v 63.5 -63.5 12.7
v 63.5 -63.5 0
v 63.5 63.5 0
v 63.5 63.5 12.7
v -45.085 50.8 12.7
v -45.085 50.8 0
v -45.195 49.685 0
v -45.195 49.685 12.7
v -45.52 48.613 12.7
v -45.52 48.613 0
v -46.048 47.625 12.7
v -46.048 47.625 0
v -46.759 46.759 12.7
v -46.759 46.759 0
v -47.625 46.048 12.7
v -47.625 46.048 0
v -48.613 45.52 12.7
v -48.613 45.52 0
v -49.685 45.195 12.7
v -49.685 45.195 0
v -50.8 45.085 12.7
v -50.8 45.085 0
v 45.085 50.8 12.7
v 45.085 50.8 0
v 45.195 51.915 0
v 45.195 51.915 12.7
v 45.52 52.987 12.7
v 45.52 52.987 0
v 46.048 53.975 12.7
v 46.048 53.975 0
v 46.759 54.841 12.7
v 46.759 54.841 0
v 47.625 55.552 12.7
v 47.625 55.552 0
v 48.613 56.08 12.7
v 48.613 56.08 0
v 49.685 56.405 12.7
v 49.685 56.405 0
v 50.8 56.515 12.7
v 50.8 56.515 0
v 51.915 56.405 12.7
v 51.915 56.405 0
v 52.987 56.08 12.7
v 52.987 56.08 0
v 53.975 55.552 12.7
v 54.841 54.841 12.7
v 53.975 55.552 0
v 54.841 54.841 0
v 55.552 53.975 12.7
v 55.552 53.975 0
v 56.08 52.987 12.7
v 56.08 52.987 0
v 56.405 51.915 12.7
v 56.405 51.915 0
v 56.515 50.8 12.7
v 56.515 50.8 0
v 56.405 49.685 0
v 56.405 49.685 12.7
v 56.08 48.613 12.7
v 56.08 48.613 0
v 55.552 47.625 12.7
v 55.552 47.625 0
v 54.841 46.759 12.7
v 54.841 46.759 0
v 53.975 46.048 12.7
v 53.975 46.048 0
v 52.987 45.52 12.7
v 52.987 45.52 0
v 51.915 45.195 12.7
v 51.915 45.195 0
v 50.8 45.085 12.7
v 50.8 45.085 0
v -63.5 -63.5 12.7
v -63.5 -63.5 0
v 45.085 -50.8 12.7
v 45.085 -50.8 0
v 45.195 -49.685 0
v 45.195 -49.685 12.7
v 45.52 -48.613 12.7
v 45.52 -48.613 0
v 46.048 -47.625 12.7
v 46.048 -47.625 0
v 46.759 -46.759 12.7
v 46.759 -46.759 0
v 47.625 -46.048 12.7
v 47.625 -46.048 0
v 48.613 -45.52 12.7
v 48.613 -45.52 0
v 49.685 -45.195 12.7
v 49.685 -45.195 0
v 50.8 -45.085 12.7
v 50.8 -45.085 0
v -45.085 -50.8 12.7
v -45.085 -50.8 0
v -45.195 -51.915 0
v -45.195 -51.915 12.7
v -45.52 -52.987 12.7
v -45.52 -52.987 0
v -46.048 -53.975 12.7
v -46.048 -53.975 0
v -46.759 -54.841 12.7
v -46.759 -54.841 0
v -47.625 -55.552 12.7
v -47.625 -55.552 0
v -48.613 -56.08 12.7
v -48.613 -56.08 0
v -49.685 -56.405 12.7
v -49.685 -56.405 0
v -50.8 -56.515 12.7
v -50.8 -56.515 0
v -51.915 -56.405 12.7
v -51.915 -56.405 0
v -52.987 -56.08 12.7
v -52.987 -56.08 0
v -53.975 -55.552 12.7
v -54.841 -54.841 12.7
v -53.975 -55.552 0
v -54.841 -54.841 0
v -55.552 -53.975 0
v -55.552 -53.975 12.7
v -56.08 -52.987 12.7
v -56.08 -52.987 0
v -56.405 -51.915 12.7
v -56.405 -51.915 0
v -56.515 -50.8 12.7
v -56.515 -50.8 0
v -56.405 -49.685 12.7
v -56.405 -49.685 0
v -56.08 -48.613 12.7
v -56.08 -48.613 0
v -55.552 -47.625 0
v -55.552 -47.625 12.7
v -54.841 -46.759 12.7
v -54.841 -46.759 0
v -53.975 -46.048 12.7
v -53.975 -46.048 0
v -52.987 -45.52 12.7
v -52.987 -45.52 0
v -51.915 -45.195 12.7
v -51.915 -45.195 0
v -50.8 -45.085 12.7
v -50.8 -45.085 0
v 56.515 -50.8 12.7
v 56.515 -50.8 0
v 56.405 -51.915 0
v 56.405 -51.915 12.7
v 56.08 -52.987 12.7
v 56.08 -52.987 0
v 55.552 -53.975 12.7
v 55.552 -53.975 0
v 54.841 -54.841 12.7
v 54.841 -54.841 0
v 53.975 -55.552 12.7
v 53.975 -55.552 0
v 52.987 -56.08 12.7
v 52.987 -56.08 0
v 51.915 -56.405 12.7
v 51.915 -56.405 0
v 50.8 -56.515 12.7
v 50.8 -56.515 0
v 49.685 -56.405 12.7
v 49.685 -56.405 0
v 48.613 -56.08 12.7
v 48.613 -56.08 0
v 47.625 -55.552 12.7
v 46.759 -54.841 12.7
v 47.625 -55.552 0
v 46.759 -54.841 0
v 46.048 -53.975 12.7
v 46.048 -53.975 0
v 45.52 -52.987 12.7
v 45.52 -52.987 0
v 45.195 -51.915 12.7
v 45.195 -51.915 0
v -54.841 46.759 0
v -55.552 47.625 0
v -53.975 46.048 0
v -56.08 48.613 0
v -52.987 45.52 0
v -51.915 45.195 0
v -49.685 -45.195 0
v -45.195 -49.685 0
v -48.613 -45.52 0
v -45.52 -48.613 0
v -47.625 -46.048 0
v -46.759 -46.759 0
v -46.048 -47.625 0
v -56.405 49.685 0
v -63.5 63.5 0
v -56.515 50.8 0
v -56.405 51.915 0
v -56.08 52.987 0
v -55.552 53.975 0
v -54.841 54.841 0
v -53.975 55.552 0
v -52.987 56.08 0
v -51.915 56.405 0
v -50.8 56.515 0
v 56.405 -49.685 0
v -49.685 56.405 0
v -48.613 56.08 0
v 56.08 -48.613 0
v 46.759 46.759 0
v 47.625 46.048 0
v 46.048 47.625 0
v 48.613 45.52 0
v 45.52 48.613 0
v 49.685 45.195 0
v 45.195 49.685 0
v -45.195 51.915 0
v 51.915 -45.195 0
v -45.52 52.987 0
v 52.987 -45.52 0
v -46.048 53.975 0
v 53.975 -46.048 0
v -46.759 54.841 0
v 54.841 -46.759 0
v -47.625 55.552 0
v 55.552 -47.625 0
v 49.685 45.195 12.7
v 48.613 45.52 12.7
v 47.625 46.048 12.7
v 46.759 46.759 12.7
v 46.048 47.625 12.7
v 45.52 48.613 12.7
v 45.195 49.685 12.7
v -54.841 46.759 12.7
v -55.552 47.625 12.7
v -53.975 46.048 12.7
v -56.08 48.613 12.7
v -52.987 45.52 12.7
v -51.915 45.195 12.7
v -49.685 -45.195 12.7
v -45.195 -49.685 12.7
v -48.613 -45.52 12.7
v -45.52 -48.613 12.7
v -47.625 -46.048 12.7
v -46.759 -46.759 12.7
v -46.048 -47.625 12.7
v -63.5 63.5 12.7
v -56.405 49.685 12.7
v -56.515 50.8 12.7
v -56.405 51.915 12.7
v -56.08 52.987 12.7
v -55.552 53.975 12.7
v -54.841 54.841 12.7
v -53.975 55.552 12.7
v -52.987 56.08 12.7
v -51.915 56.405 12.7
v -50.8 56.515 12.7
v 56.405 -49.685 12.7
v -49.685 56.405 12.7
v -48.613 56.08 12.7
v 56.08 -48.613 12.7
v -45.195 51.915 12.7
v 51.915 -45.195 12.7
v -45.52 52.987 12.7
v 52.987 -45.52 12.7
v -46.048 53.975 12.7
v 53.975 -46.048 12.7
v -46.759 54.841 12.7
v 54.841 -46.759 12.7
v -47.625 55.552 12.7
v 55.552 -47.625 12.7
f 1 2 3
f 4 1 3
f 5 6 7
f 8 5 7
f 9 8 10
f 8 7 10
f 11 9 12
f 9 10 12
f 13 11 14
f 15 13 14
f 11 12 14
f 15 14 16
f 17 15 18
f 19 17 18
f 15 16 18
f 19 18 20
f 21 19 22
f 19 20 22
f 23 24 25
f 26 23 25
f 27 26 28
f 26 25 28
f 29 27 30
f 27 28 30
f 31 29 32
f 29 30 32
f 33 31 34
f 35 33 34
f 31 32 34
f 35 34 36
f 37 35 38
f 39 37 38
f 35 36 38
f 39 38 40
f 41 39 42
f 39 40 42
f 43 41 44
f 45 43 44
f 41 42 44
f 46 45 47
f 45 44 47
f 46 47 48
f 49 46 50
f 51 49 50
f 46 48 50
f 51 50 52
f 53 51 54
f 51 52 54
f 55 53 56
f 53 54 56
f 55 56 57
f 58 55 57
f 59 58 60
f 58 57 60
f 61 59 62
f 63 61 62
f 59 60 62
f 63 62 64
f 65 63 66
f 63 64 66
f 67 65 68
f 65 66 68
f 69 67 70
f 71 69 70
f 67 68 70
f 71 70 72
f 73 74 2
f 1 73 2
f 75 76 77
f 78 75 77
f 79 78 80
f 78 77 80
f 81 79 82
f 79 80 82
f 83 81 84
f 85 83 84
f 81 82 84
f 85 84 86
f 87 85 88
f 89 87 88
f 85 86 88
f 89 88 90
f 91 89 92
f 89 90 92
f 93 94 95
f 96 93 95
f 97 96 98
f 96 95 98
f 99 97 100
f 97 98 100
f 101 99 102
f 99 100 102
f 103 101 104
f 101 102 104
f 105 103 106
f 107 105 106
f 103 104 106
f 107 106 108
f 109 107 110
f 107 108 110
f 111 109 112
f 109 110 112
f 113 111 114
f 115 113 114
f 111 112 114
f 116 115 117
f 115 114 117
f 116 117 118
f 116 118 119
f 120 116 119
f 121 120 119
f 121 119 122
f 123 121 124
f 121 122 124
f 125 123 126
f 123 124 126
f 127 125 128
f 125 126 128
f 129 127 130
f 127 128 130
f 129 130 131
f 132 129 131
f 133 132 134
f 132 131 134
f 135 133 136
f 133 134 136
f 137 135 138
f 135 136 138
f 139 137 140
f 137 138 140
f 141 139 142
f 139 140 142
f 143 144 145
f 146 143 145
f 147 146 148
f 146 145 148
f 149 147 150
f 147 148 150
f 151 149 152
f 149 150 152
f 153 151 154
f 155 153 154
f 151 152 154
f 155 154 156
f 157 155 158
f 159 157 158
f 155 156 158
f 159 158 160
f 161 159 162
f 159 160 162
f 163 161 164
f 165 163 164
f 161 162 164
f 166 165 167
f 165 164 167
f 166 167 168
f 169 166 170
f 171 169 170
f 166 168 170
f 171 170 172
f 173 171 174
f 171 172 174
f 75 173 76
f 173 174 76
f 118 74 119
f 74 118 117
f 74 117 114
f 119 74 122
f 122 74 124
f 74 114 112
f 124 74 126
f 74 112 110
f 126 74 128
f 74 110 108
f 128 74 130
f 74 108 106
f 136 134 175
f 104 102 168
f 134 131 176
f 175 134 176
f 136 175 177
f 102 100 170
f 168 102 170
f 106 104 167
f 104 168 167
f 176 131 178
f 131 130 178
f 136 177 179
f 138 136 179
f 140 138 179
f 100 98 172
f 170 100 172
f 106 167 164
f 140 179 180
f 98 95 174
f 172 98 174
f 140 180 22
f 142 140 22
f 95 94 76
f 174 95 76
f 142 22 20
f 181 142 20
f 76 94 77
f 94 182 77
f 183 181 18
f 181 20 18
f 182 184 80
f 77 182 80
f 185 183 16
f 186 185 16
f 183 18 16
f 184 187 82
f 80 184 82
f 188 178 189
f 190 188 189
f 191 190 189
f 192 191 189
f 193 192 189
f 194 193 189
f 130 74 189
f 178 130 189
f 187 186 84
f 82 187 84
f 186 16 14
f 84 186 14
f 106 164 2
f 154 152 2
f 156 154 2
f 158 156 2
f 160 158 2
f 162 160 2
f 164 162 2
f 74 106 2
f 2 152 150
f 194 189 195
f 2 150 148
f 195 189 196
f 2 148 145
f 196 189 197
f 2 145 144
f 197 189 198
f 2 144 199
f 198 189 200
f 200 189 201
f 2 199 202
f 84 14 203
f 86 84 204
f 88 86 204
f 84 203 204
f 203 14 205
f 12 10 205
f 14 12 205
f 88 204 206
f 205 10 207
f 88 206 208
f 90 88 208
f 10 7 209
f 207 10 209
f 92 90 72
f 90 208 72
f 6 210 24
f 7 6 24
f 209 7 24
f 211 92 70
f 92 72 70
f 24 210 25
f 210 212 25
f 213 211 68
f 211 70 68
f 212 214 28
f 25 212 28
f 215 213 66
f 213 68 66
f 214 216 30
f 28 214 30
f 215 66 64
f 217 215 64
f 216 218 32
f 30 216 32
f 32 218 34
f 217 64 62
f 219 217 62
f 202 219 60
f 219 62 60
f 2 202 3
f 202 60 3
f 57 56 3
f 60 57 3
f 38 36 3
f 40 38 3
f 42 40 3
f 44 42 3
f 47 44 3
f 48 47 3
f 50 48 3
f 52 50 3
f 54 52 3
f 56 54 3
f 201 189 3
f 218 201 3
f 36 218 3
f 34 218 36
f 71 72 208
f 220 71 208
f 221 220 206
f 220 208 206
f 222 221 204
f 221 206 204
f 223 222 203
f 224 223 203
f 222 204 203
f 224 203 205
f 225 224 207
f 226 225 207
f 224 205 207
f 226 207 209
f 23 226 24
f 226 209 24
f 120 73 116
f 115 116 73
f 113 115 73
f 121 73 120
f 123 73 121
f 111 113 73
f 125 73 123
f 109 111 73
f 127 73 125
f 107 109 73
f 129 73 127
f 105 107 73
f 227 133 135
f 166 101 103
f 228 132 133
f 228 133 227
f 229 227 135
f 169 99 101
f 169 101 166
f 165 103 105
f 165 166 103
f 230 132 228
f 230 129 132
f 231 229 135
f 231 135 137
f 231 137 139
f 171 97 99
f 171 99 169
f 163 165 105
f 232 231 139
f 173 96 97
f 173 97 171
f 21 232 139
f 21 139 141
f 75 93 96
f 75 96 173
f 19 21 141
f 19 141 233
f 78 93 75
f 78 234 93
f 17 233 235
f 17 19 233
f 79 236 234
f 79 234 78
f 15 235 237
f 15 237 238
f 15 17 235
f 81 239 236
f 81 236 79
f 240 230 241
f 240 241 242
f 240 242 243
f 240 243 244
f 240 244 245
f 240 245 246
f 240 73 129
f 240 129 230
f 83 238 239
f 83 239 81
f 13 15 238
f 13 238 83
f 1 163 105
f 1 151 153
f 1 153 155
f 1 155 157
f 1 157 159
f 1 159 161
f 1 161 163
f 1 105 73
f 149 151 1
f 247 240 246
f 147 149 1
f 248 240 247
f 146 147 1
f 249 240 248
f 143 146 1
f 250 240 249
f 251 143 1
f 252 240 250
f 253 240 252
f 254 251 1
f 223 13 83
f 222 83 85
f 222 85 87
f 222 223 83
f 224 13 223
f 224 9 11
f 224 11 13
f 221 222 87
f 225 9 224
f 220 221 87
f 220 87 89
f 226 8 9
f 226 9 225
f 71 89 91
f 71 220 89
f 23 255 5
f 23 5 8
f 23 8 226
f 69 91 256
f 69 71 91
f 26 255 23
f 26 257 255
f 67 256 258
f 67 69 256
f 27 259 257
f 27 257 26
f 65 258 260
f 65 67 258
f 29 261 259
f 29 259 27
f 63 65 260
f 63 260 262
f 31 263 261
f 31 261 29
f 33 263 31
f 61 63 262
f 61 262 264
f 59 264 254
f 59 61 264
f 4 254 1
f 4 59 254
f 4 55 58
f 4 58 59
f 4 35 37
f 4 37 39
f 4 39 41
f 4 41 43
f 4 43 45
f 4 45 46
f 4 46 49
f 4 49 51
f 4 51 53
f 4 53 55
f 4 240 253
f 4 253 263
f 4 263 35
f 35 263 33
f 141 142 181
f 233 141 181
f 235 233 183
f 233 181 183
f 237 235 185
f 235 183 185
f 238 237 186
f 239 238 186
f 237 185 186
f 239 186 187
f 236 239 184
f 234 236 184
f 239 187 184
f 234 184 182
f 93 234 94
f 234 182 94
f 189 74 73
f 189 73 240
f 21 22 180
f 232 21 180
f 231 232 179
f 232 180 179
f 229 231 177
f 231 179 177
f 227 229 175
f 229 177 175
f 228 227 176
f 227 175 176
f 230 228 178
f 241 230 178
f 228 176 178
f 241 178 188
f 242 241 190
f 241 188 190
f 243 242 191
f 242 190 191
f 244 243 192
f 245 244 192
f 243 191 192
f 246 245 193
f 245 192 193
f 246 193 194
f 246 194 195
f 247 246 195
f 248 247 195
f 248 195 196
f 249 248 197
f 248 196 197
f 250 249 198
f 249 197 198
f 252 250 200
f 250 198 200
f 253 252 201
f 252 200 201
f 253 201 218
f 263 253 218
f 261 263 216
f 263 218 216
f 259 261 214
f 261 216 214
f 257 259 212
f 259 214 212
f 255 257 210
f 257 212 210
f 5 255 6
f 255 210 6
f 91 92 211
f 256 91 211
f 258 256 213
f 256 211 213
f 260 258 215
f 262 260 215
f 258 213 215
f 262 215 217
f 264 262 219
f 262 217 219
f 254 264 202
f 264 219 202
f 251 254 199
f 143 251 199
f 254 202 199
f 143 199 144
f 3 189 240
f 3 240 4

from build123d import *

# Parameters (mm, degrees)
F0_W     = 127
F0_H     = 127
F2_DEPTH = 12.7


# Not quite as in the source:
# - the program builds the solid bodies; features that only make, move or delete a surface that nothing else refers to are left out


with BuildPart() as f2:
    # F0 (on Top) → F2 (new body)
    with BuildSketch(Plane.XY):
        Rectangle(F0_W, F0_H)
        with BuildLine():
            ThreePointArc((-50.8, 45.085), (-54.8411152545, 54.8411152545), (-45.085, 50.8))
            Line((-45.085, 50.8), (45.085, 50.8))
            ThreePointArc((45.085, 50.8), (50.8, 56.515), (56.515, 50.8))
            ThreePointArc((56.515, 50.8), (54.8411152545, 46.7588847455), (50.8, 45.085))
            Line((50.8, 45.085), (50.8, -45.085))
            ThreePointArc((50.8, -45.085), (54.8411152545, -46.7588847455), (56.515, -50.8))
            ThreePointArc((56.515, -50.8), (50.8, -56.515), (45.085, -50.8))
            Line((45.085, -50.8), (-45.085, -50.8))
            ThreePointArc((-45.085, -50.8), (-54.8411152545, -54.8411152545), (-50.8, -45.085))
            Line((-50.8, -45.085), (-50.8, 45.085))
        make_face(mode=Mode.SUBTRACT)
        with BuildLine():
            Line((45.085, 50.8), (-45.085, 50.8))
            ThreePointArc((-45.085, 50.8), (-46.7588847455, 46.7588847455), (-50.8, 45.085))
            Line((-50.8, 45.085), (-50.8, -45.085))
            ThreePointArc((-50.8, -45.085), (-46.7588847455, -46.7588847455), (-45.085, -50.8))
            Line((-45.085, -50.8), (45.085, -50.8))
            ThreePointArc((45.085, -50.8), (46.7588847455, -46.7588847455), (50.8, -45.085))
            Line((50.8, -45.085), (50.8, 45.085))
            ThreePointArc((50.8, 45.085), (46.7588847455, 46.7588847455), (45.085, 50.8))
        make_face()
    extrude(amount=F2_DEPTH)


solid = f2.part
